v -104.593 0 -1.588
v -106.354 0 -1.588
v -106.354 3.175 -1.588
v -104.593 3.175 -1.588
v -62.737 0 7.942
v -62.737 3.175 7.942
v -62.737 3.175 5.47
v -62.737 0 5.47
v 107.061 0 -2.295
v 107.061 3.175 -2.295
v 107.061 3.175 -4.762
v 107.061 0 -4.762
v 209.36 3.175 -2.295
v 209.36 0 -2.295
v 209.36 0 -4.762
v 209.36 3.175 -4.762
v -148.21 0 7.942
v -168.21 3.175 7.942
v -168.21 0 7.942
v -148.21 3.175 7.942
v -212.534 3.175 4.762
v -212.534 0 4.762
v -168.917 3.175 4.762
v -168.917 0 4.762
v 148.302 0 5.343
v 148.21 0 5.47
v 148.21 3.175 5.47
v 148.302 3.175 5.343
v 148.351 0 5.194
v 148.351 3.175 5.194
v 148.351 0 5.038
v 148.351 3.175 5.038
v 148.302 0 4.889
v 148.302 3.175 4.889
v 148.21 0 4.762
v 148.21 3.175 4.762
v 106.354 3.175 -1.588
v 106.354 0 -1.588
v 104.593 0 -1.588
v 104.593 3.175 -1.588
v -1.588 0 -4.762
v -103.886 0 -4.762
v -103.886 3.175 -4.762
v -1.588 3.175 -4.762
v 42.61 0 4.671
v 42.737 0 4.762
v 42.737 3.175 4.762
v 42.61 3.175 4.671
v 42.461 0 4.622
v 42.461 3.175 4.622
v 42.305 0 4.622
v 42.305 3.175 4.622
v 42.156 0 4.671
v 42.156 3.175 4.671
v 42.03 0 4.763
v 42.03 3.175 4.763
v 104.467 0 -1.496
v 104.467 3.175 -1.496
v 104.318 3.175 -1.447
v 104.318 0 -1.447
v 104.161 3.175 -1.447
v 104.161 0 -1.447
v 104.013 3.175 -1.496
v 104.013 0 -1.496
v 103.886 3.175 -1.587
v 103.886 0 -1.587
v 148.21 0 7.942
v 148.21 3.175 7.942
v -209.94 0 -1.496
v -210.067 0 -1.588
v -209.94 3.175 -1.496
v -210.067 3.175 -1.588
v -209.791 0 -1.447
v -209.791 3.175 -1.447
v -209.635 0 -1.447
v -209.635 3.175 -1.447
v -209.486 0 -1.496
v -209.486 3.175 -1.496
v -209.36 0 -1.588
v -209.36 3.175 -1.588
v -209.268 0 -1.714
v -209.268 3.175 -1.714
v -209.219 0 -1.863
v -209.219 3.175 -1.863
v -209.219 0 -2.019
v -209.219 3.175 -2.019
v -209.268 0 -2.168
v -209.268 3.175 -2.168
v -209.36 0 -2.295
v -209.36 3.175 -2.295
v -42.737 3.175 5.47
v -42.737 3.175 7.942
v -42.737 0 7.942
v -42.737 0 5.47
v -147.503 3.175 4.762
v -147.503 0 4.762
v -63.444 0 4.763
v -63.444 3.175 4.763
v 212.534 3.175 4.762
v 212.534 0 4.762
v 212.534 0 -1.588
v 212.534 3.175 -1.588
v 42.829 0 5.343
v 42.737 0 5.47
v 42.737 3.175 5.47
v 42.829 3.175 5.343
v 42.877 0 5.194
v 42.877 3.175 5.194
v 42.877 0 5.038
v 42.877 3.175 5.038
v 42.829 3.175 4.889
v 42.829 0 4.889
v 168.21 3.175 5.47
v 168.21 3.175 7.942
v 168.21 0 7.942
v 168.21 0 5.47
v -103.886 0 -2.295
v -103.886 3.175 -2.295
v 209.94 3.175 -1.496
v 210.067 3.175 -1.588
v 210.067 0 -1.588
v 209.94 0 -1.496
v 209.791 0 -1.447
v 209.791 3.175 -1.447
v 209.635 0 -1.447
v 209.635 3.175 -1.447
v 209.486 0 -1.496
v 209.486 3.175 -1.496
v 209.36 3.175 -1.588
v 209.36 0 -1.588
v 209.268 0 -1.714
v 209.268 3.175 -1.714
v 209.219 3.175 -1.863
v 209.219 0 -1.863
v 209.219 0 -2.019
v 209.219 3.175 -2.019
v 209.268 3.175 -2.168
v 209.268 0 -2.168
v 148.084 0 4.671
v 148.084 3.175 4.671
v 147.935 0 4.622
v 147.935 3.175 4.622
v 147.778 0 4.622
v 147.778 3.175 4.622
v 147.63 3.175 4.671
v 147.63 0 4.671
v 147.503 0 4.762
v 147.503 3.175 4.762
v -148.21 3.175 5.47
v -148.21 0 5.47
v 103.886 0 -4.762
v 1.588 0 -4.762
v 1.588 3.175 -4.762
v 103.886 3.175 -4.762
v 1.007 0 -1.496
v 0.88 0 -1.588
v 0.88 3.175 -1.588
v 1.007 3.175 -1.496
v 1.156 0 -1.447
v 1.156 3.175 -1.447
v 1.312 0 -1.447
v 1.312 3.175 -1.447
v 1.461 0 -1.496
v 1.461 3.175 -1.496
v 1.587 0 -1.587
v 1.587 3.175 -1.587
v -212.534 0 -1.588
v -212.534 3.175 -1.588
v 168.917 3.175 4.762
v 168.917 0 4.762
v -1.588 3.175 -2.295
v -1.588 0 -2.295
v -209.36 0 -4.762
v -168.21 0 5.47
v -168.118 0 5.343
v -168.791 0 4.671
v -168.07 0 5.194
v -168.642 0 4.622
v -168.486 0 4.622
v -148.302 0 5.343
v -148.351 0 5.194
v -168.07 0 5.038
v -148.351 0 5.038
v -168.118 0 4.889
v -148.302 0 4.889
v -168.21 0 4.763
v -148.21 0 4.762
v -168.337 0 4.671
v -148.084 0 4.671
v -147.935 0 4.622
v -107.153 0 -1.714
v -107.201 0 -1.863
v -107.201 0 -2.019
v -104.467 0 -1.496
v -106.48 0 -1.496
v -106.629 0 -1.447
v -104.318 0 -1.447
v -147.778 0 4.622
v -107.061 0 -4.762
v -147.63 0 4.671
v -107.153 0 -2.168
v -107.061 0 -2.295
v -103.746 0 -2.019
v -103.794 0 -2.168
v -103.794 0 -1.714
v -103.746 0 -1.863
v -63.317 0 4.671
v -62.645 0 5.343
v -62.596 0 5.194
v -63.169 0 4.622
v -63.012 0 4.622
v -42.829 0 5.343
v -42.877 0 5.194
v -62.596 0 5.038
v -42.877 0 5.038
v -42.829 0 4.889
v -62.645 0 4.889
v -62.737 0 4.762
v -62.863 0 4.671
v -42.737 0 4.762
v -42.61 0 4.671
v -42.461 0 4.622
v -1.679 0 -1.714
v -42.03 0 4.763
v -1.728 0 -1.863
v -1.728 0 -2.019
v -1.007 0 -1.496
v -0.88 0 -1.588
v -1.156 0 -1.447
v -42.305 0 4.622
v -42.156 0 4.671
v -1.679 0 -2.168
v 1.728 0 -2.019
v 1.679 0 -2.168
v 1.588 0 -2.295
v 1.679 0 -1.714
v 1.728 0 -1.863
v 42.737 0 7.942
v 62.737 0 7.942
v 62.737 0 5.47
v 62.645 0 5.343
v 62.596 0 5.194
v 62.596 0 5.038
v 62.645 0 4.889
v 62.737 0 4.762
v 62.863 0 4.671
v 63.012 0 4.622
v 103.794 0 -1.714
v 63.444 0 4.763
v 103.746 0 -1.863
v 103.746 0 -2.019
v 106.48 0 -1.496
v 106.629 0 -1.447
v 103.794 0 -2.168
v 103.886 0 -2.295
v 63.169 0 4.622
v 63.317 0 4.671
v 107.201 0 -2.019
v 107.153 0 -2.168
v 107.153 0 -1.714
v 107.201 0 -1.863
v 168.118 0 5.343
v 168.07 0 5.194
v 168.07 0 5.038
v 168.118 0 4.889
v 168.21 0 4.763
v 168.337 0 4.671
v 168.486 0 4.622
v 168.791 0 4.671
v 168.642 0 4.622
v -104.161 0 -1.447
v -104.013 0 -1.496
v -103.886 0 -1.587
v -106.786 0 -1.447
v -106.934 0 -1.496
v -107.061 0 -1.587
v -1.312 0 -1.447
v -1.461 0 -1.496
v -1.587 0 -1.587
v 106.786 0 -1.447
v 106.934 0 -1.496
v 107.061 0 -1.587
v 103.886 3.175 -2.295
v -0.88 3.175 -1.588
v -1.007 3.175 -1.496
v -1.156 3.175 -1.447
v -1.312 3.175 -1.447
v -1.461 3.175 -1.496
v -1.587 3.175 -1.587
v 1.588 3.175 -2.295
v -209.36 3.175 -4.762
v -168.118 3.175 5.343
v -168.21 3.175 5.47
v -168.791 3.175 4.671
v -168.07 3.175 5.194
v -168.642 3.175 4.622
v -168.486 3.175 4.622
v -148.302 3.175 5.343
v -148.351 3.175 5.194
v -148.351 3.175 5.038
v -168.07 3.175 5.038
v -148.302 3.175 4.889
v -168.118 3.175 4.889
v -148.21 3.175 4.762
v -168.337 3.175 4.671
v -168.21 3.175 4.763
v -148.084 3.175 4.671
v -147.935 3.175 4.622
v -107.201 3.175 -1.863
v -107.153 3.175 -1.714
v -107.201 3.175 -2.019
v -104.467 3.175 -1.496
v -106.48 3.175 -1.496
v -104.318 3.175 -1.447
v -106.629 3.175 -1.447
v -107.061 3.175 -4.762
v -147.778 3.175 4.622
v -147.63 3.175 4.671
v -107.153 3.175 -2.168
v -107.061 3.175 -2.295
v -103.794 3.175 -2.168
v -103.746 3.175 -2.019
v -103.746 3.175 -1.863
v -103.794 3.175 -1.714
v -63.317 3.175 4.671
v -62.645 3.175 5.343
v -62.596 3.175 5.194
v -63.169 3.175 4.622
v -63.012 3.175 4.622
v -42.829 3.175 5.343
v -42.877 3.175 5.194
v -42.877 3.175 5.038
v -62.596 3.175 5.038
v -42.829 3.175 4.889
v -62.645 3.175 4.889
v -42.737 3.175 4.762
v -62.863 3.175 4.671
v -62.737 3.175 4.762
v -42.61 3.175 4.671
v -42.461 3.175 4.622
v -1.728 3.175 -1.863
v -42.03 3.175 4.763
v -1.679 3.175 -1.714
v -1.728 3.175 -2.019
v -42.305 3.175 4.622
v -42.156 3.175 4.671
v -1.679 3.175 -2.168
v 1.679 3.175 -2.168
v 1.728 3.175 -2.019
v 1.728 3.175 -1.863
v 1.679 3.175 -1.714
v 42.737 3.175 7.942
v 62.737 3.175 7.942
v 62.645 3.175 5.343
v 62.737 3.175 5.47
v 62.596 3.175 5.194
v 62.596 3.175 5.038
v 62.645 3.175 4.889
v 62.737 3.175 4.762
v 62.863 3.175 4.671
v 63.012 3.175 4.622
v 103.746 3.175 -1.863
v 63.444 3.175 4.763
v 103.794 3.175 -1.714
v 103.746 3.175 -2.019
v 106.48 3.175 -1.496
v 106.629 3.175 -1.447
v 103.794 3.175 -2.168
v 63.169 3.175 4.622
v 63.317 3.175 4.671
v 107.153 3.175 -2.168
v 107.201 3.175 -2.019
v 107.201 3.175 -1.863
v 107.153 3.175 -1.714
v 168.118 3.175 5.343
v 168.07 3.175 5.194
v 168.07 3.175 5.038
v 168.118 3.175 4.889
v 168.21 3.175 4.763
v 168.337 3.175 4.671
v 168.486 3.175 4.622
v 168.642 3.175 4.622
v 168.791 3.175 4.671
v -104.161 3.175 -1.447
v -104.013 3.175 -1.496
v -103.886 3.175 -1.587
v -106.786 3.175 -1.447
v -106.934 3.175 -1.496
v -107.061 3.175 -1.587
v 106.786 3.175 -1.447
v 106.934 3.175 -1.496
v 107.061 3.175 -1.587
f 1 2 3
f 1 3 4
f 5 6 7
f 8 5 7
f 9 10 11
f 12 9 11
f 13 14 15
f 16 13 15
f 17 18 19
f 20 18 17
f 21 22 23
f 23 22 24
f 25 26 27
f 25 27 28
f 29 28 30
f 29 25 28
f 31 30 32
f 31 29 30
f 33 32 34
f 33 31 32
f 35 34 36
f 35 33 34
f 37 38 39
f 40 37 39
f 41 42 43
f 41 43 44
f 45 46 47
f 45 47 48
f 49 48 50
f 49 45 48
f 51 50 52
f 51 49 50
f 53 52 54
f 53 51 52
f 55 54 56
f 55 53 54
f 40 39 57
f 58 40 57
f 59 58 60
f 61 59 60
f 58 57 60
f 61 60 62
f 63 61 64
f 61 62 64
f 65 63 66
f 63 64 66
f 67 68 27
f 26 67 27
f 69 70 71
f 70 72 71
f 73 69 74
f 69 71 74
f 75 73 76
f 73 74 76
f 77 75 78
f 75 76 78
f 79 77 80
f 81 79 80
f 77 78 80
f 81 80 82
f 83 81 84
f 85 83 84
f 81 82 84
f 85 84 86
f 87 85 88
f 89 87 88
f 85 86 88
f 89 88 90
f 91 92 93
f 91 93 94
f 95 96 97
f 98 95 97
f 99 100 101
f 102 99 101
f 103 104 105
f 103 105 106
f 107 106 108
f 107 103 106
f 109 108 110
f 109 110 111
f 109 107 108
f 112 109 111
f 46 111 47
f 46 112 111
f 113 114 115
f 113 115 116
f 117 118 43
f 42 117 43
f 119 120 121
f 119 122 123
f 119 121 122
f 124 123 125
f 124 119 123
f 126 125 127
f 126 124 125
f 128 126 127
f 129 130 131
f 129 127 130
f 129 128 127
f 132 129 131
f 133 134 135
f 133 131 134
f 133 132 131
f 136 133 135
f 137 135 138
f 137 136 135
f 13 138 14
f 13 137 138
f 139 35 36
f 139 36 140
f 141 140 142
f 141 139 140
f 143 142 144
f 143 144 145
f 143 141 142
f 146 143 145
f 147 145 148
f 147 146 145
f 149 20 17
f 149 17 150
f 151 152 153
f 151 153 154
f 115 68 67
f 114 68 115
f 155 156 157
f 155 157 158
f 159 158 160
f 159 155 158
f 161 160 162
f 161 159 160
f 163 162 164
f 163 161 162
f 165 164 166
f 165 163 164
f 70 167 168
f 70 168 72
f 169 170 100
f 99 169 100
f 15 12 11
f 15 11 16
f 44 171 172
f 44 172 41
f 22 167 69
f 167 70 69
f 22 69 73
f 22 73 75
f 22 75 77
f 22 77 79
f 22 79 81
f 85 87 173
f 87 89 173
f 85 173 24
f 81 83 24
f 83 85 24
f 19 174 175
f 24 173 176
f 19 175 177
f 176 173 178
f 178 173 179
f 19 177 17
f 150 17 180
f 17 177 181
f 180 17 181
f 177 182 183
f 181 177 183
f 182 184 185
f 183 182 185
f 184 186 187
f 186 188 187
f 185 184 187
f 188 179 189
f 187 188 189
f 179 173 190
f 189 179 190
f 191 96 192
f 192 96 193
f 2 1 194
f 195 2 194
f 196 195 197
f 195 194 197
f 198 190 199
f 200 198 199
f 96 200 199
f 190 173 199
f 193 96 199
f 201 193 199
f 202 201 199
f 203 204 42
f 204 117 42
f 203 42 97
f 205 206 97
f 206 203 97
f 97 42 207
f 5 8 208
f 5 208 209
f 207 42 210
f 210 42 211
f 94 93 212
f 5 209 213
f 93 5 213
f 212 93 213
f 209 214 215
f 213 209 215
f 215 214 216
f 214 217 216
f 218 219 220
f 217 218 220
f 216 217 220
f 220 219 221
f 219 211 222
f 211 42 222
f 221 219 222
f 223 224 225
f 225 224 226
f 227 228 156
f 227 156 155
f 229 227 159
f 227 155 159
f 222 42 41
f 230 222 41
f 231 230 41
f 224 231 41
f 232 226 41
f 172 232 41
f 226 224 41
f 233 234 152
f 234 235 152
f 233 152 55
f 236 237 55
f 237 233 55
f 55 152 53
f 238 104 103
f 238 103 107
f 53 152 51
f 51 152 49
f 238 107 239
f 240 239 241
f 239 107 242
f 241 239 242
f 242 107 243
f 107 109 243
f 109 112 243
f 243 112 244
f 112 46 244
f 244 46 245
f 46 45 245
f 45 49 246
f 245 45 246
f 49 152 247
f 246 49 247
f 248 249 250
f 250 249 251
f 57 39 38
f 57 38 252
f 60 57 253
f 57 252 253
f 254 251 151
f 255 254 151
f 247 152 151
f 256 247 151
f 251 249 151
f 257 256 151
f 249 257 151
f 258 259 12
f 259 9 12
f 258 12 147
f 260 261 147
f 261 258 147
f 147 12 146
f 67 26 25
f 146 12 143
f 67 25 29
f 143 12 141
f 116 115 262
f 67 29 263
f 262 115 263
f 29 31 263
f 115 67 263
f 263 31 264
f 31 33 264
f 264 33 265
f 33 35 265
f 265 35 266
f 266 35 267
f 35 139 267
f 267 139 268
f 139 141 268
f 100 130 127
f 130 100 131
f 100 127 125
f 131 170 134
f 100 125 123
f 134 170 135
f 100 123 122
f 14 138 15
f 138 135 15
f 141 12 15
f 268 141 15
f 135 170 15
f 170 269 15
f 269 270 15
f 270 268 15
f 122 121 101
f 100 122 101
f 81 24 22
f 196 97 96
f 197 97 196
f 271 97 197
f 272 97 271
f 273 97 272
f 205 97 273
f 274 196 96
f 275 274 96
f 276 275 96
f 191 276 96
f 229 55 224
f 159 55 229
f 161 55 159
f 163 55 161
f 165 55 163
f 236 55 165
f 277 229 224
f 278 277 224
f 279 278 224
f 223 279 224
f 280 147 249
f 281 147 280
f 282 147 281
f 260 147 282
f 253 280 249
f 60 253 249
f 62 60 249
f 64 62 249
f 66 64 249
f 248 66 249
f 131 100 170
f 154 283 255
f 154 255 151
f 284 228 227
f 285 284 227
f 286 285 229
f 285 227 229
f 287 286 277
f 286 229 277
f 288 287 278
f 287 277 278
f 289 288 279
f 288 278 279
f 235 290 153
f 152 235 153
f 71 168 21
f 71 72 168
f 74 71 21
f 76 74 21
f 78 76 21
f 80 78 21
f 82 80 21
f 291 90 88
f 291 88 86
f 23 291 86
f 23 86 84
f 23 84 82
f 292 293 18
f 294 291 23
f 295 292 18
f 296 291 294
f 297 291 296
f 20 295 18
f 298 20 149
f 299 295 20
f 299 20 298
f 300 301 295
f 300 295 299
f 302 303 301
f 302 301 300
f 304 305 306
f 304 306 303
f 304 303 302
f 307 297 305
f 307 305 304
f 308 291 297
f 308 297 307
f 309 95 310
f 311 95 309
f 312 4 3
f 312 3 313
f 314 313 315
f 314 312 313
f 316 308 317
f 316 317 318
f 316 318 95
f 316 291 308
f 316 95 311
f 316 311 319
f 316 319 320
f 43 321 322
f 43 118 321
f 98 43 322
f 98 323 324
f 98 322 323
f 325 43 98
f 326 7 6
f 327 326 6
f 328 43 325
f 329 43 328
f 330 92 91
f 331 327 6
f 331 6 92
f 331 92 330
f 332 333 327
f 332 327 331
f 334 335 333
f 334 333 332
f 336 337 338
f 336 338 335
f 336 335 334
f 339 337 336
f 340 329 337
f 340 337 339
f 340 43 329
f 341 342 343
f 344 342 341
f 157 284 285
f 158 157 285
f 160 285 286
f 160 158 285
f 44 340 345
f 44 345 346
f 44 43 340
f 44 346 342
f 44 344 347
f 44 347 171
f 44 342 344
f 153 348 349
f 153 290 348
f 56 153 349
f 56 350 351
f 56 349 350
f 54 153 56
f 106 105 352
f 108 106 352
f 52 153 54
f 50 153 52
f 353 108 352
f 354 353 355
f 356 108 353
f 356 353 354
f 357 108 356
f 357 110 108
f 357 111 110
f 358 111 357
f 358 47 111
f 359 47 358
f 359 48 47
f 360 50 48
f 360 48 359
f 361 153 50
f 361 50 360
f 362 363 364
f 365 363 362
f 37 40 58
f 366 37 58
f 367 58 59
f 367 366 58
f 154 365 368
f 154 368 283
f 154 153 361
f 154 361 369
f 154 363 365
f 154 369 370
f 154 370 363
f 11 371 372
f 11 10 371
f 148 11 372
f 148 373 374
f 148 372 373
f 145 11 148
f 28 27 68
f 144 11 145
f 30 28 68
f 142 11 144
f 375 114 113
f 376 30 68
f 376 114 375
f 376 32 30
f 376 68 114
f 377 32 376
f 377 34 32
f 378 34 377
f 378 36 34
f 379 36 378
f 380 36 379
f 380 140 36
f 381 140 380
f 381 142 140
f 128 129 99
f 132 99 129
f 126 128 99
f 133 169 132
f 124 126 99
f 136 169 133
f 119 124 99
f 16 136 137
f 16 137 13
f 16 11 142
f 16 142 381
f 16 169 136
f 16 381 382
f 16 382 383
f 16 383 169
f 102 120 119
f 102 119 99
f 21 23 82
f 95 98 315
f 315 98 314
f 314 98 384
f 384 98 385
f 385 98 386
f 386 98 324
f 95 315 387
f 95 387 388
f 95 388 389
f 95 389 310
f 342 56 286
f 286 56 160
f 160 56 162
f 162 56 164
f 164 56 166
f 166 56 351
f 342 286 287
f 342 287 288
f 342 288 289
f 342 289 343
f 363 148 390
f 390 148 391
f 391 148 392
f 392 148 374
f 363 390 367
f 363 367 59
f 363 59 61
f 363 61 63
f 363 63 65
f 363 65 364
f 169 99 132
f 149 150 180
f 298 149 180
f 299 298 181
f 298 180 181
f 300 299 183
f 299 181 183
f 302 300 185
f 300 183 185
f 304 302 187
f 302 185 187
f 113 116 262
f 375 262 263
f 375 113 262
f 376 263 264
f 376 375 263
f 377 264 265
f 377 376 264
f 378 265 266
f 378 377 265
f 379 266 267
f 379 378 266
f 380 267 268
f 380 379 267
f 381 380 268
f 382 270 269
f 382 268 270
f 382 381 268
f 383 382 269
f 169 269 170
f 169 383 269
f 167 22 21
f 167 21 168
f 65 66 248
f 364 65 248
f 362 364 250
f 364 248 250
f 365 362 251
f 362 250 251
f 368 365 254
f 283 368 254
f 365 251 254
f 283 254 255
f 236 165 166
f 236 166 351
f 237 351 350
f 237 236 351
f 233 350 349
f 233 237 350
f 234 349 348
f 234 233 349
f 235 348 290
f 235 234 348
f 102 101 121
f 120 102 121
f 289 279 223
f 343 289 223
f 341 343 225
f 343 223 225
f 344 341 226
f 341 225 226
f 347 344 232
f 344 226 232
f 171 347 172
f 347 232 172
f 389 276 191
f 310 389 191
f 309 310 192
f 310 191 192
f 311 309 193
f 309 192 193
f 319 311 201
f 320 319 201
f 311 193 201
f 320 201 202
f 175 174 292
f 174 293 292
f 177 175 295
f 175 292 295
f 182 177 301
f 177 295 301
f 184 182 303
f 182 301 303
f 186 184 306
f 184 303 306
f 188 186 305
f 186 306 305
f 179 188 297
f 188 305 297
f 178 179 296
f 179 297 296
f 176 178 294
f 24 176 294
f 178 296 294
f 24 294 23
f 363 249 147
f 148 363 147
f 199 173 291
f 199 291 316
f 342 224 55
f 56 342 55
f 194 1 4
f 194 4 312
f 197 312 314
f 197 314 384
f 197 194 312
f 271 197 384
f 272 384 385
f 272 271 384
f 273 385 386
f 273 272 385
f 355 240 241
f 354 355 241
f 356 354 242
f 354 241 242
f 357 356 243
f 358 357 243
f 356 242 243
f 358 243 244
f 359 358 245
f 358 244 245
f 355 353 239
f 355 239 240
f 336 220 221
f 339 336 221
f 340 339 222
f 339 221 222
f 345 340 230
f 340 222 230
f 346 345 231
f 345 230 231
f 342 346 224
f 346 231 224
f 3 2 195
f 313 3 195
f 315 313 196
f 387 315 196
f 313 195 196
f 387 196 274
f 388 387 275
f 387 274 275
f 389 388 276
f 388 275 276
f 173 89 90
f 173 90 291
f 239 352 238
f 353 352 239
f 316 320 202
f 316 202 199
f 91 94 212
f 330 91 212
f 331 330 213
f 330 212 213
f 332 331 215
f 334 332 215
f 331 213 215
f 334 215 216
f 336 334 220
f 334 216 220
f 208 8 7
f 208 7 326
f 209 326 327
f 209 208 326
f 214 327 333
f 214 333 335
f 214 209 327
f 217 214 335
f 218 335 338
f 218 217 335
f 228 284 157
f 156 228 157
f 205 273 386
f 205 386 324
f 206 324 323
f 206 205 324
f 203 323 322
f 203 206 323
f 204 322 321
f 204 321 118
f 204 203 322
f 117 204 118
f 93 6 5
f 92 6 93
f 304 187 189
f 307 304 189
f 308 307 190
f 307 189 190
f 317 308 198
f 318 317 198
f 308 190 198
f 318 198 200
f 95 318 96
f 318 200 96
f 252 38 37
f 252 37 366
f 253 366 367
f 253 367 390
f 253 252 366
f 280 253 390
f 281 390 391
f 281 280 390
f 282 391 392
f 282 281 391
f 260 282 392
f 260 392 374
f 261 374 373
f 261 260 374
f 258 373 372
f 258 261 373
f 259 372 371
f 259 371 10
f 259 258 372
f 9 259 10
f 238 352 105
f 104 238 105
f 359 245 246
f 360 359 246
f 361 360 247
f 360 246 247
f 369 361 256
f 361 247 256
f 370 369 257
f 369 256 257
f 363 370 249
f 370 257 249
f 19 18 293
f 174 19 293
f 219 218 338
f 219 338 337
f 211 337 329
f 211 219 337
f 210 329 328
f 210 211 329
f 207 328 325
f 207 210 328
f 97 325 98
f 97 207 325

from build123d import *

# Parameters (mm, degrees)
SKETCH1_W             = 425.069
SKETCH1_H             = 9.525
BOSS_EXTRUDE1_DEPTH   = 3.175
SKETCH2_W             = 3.175
SKETCH2_H             = 3.175
CUT_EXTRUDE1_DEPTH    = 213.611560649
SKETCH3_R             = 0.5
CUT_EXTRUDE2_DEPTH    = 213.611560649
SKETCH_PATTERN1_DEPTH = 3.175
SKETCH5_W             = 20
SKETCH5_H             = 3.18
BOSS_EXTRUDE2_DEPTH   = 3.175
SKETCH6_R             = 0.5
CUT_EXTRUDE3_DEPTH    = 213.706552841
SKETCH_PATTERN2_DEPTH = 3.175


# Read off the part's stored shape, not the designer's step: Sketch-Pattern1, Sketch-Pattern2
with BuildPart() as part:
    # Sketch1 → Boss-Extrude1 (new body)
    with BuildSketch(Plane(origin=(0, 0, 0), x_dir=(1, 0, 0), z_dir=(0, 1, 0))):
        Rectangle(SKETCH1_W, SKETCH1_H)
    extrude(amount=BOSS_EXTRUDE1_DEPTH)

    # Sketch2 → Cut-Extrude1 (cut, symmetric)
    with BuildSketch(Plane(origin=(0, 3.175, 0), x_dir=(1, 0, 0), z_dir=(0, 1, 0))):
        with Locations((-105.4735, 3.175)):
            Rectangle(SKETCH2_W, SKETCH2_H)
        with Locations((-210.947, 3.175)):
            Rectangle(SKETCH2_W, SKETCH2_H)
        with Locations((0, 3.175)):
            Rectangle(SKETCH2_W, SKETCH2_H)
    cut_extrude1 = extrude(amount=CUT_EXTRUDE1_DEPTH, both=True, mode=Mode.SUBTRACT)

    # Sketch3 → Cut-Extrude2 (cut, symmetric)
    with BuildSketch(Plane(origin=(0, 3.175, 0), x_dir=(1, 0, 0), z_dir=(0, 1, 0))):
        with Locations((-209.713053391, 1.941053391)):
            Circle(SKETCH3_R)
    cut_extrude2 = extrude(amount=CUT_EXTRUDE2_DEPTH, both=True, mode=Mode.SUBTRACT)

    # Mirror1: Cut-Extrude1 across plane
    add(cut_extrude1.mirror(Plane(origin=(0, 0, 0), x_dir=(0, 0, 1), z_dir=(1, 0, 0))), mode=Mode.SUBTRACT)

    # Sketch-Pattern1 outline → Sketch-Pattern1 (cut)
    with BuildSketch(Plane(origin=(0, 0, 0), x_dir=(1, 0, 0), z_dir=(0, 1, 0))):
        with BuildLine():
            Line((-103.886, 1.5875), (-104.593106781, 1.5875))
            ThreePointArc((-104.593106781, 1.5875), (-104.23955339, 1.441053391), (-103.886, 1.5875))
        make_face()
        with BuildLine():
            Line((-103.886, 2.294606781), (-103.886, 1.5875))
            ThreePointArc((-103.886, 1.5875), (-103.739553391, 1.941053391), (-103.886, 2.294606781))
        make_face()
        with BuildLine():
            Line((107.061, 1.5875), (106.353893219, 1.5875))
            ThreePointArc((106.353893219, 1.5875), (106.70744661, 1.441053391), (107.061, 1.5875))
        make_face()
        with BuildLine():
            Line((107.061, 2.294606781), (107.061, 1.5875))
            ThreePointArc((107.061, 1.5875), (107.207446609, 1.941053391), (107.061, 2.294606781))
        make_face()
        with BuildLine():
            Line((1.5875, 1.5875), (0.880393219, 1.5875))
            ThreePointArc((0.880393219, 1.5875), (1.23394661, 1.441053391), (1.5875, 1.5875))
        make_face()
        with BuildLine():
            Line((1.5875, 2.294606781), (1.5875, 1.5875))
            ThreePointArc((1.5875, 1.5875), (1.733946609, 1.941053391), (1.5875, 2.294606781))
        make_face()
    sketch_pattern1 = extrude(amount=SKETCH_PATTERN1_DEPTH, mode=Mode.SUBTRACT)

    # Mirror2: Cut-Extrude2, Sketch-Pattern1 across plane
    add(cut_extrude2.mirror(Plane(origin=(0, 0, 0), x_dir=(0, 0, 1), z_dir=(1, 0, 0))), mode=Mode.SUBTRACT)
    add(sketch_pattern1.mirror(Plane(origin=(0, 0, 0), x_dir=(0, 0, 1), z_dir=(1, 0, 0))), mode=Mode.SUBTRACT)

    # Sketch5 → Boss-Extrude2 (add)
    with BuildSketch(Plane(origin=(0, 3.175, 0), x_dir=(1, 0, 0), z_dir=(0, 1, 0))):
        with Locations((-158.21025, -6.3525)):
            Rectangle(SKETCH5_W, SKETCH5_H)
        with Locations((-52.73675, -6.3525)):
            Rectangle(SKETCH5_W, SKETCH5_H)
        with Locations((52.73675, -6.3525)):
            Rectangle(SKETCH5_W, SKETCH5_H)
        with Locations((158.21025, -6.3525)):
            Rectangle(SKETCH5_W, SKETCH5_H)
    extrude(amount=-BOSS_EXTRUDE2_DEPTH)

    # Sketch6 → Cut-Extrude3 (cut, symmetric)
    with BuildSketch(Plane(origin=(0, 3.175, 0), x_dir=(1, 0, 0), z_dir=(0, 1, 0))):
        with Locations((-168.563803391, -5.116053391)):
            Circle(SKETCH6_R)
    cut_extrude3 = extrude(amount=CUT_EXTRUDE3_DEPTH, both=True, mode=Mode.SUBTRACT)

    # Sketch-Pattern2 outline → Sketch-Pattern2 (cut)
    with BuildSketch(Plane(origin=(0, 0, 0), x_dir=(1, 0, 0), z_dir=(0, 1, 0))):
        with BuildLine():
            Line((-62.73675, -4.7625), (-62.73675, -5.469606781))
            ThreePointArc((-62.73675, -5.469606781), (-62.590303391, -5.116053391), (-62.73675, -4.7625))
        make_face()
        with BuildLine():
            Line((-63.443856781, -4.7625), (-62.73675, -4.7625))
            ThreePointArc((-62.73675, -4.7625), (-63.09030339, -4.616053391), (-63.443856781, -4.7625))
        make_face()
        with BuildLine():
            Line((148.21025, -4.7625), (148.21025, -5.469606781))
            ThreePointArc((148.21025, -5.469606781), (148.356696609, -5.116053391), (148.21025, -4.7625))
        make_face()
        with BuildLine():
            Line((147.503143219, -4.7625), (148.21025, -4.7625))
            ThreePointArc((148.21025, -4.7625), (147.85669661, -4.616053391), (147.503143219, -4.7625))
        make_face()
        with BuildLine():
            Line((42.73675, -4.7625), (42.73675, -5.469606781))
            ThreePointArc((42.73675, -5.469606781), (42.883196609, -5.116053391), (42.73675, -4.7625))
        make_face()
        with BuildLine():
            Line((42.029643219, -4.7625), (42.73675, -4.7625))
            ThreePointArc((42.73675, -4.7625), (42.38319661, -4.616053391), (42.029643219, -4.7625))
        make_face()
    sketch_pattern2 = extrude(amount=SKETCH_PATTERN2_DEPTH, mode=Mode.SUBTRACT)

    # Mirror3: Cut-Extrude3, Sketch-Pattern2 across plane
    add(cut_extrude3.mirror(Plane(origin=(0, 0, 0), x_dir=(0, 0, 1), z_dir=(1, 0, 0))), mode=Mode.SUBTRACT)
    add(sketch_pattern2.mirror(Plane(origin=(0, 0, 0), x_dir=(0, 0, 1), z_dir=(1, 0, 0))), mode=Mode.SUBTRACT)


solid = part.part
